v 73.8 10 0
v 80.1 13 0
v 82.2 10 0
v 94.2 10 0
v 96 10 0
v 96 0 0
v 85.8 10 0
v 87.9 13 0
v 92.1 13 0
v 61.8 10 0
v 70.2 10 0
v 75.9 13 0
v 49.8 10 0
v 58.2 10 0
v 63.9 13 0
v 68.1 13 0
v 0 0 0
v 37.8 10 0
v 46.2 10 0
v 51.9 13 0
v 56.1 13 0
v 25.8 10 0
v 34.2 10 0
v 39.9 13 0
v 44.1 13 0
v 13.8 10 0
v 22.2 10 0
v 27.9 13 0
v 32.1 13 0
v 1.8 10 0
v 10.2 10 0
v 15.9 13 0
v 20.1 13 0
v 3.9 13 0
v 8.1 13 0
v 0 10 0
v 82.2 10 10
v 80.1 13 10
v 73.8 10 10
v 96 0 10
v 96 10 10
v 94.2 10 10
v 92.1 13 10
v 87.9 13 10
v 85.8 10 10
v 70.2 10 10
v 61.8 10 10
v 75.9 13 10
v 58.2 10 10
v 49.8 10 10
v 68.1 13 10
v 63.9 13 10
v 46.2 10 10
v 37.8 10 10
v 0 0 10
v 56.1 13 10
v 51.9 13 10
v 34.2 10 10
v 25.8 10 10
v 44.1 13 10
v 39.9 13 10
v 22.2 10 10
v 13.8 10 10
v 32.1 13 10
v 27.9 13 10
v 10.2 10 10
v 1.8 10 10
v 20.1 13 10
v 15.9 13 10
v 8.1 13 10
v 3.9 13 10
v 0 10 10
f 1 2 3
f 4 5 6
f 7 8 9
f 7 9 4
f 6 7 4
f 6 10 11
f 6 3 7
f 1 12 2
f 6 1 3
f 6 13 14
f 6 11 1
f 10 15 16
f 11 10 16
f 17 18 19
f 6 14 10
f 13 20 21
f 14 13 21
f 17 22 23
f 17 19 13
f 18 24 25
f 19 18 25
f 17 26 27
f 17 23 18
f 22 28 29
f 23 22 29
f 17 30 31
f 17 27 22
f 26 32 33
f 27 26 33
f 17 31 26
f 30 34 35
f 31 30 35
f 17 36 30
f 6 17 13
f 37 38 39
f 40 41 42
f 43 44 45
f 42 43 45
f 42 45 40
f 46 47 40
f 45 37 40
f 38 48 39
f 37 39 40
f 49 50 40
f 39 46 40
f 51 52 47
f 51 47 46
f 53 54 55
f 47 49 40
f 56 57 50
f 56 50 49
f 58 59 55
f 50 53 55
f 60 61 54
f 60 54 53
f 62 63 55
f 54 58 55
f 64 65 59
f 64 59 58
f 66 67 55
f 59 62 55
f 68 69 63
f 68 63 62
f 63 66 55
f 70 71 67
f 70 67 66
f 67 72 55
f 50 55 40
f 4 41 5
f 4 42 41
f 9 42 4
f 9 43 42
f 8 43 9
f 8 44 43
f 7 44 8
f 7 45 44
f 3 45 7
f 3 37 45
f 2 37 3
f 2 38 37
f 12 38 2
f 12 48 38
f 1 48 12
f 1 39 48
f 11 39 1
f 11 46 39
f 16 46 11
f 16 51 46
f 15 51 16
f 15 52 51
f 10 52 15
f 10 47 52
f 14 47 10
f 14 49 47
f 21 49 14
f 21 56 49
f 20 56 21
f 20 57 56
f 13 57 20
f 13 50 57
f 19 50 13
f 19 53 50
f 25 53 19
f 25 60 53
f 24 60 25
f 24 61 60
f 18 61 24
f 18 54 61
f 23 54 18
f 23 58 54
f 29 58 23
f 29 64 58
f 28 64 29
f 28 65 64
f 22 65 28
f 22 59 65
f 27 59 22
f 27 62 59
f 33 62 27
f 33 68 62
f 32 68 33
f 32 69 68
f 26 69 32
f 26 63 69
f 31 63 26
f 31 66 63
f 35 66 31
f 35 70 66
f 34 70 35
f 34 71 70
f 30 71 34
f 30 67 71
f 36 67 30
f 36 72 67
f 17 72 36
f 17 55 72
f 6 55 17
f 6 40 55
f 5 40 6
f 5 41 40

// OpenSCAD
$fn = 32;

// ----------------------------------------------------------------------
// Gear rack: 8 teeth, pitch 12 mm
// ----------------------------------------------------------------------

// --- parameters (mm) ---
teeth = 8;                // number of teeth
pitch = 12;               // tooth pitch, X
root_w = 8.4;             // tooth width at the root
tip_w = 4.2;              // tooth width at the tip
base_h = 10;              // rack body height, Y
tooth_h = 3;              // tooth height above the body
plate_t = 10;             // rack width, Z (extrusion height)

rack_l = teeth * pitch;  // overall length
total_h = base_h + tooth_h;  // overall height

profile = [[0, 0], [96, 0], [96, 10], [94.2, 10], [92.1, 13], [87.9, 13], [85.8, 10], [82.2, 10], [80.1, 13], [75.9, 13], [73.8, 10], [70.2, 10], [68.1, 13], [63.9, 13], [61.8, 10], [58.2, 10], [56.1, 13], [51.9, 13], [49.8, 10], [46.2, 10], [44.1, 13], [39.9, 13], [37.8, 10], [34.2, 10], [32.1, 13], [27.9, 13], [25.8, 10], [22.2, 10], [20.1, 13], [15.9, 13], [13.8, 10], [10.2, 10], [8.1, 13], [3.9, 13], [1.8, 10], [0, 10]];  // primary outline, 36 points, counter clockwise

// --- the one profile operation ---
linear_extrude(height = plate_t) polygon(points = profile);
